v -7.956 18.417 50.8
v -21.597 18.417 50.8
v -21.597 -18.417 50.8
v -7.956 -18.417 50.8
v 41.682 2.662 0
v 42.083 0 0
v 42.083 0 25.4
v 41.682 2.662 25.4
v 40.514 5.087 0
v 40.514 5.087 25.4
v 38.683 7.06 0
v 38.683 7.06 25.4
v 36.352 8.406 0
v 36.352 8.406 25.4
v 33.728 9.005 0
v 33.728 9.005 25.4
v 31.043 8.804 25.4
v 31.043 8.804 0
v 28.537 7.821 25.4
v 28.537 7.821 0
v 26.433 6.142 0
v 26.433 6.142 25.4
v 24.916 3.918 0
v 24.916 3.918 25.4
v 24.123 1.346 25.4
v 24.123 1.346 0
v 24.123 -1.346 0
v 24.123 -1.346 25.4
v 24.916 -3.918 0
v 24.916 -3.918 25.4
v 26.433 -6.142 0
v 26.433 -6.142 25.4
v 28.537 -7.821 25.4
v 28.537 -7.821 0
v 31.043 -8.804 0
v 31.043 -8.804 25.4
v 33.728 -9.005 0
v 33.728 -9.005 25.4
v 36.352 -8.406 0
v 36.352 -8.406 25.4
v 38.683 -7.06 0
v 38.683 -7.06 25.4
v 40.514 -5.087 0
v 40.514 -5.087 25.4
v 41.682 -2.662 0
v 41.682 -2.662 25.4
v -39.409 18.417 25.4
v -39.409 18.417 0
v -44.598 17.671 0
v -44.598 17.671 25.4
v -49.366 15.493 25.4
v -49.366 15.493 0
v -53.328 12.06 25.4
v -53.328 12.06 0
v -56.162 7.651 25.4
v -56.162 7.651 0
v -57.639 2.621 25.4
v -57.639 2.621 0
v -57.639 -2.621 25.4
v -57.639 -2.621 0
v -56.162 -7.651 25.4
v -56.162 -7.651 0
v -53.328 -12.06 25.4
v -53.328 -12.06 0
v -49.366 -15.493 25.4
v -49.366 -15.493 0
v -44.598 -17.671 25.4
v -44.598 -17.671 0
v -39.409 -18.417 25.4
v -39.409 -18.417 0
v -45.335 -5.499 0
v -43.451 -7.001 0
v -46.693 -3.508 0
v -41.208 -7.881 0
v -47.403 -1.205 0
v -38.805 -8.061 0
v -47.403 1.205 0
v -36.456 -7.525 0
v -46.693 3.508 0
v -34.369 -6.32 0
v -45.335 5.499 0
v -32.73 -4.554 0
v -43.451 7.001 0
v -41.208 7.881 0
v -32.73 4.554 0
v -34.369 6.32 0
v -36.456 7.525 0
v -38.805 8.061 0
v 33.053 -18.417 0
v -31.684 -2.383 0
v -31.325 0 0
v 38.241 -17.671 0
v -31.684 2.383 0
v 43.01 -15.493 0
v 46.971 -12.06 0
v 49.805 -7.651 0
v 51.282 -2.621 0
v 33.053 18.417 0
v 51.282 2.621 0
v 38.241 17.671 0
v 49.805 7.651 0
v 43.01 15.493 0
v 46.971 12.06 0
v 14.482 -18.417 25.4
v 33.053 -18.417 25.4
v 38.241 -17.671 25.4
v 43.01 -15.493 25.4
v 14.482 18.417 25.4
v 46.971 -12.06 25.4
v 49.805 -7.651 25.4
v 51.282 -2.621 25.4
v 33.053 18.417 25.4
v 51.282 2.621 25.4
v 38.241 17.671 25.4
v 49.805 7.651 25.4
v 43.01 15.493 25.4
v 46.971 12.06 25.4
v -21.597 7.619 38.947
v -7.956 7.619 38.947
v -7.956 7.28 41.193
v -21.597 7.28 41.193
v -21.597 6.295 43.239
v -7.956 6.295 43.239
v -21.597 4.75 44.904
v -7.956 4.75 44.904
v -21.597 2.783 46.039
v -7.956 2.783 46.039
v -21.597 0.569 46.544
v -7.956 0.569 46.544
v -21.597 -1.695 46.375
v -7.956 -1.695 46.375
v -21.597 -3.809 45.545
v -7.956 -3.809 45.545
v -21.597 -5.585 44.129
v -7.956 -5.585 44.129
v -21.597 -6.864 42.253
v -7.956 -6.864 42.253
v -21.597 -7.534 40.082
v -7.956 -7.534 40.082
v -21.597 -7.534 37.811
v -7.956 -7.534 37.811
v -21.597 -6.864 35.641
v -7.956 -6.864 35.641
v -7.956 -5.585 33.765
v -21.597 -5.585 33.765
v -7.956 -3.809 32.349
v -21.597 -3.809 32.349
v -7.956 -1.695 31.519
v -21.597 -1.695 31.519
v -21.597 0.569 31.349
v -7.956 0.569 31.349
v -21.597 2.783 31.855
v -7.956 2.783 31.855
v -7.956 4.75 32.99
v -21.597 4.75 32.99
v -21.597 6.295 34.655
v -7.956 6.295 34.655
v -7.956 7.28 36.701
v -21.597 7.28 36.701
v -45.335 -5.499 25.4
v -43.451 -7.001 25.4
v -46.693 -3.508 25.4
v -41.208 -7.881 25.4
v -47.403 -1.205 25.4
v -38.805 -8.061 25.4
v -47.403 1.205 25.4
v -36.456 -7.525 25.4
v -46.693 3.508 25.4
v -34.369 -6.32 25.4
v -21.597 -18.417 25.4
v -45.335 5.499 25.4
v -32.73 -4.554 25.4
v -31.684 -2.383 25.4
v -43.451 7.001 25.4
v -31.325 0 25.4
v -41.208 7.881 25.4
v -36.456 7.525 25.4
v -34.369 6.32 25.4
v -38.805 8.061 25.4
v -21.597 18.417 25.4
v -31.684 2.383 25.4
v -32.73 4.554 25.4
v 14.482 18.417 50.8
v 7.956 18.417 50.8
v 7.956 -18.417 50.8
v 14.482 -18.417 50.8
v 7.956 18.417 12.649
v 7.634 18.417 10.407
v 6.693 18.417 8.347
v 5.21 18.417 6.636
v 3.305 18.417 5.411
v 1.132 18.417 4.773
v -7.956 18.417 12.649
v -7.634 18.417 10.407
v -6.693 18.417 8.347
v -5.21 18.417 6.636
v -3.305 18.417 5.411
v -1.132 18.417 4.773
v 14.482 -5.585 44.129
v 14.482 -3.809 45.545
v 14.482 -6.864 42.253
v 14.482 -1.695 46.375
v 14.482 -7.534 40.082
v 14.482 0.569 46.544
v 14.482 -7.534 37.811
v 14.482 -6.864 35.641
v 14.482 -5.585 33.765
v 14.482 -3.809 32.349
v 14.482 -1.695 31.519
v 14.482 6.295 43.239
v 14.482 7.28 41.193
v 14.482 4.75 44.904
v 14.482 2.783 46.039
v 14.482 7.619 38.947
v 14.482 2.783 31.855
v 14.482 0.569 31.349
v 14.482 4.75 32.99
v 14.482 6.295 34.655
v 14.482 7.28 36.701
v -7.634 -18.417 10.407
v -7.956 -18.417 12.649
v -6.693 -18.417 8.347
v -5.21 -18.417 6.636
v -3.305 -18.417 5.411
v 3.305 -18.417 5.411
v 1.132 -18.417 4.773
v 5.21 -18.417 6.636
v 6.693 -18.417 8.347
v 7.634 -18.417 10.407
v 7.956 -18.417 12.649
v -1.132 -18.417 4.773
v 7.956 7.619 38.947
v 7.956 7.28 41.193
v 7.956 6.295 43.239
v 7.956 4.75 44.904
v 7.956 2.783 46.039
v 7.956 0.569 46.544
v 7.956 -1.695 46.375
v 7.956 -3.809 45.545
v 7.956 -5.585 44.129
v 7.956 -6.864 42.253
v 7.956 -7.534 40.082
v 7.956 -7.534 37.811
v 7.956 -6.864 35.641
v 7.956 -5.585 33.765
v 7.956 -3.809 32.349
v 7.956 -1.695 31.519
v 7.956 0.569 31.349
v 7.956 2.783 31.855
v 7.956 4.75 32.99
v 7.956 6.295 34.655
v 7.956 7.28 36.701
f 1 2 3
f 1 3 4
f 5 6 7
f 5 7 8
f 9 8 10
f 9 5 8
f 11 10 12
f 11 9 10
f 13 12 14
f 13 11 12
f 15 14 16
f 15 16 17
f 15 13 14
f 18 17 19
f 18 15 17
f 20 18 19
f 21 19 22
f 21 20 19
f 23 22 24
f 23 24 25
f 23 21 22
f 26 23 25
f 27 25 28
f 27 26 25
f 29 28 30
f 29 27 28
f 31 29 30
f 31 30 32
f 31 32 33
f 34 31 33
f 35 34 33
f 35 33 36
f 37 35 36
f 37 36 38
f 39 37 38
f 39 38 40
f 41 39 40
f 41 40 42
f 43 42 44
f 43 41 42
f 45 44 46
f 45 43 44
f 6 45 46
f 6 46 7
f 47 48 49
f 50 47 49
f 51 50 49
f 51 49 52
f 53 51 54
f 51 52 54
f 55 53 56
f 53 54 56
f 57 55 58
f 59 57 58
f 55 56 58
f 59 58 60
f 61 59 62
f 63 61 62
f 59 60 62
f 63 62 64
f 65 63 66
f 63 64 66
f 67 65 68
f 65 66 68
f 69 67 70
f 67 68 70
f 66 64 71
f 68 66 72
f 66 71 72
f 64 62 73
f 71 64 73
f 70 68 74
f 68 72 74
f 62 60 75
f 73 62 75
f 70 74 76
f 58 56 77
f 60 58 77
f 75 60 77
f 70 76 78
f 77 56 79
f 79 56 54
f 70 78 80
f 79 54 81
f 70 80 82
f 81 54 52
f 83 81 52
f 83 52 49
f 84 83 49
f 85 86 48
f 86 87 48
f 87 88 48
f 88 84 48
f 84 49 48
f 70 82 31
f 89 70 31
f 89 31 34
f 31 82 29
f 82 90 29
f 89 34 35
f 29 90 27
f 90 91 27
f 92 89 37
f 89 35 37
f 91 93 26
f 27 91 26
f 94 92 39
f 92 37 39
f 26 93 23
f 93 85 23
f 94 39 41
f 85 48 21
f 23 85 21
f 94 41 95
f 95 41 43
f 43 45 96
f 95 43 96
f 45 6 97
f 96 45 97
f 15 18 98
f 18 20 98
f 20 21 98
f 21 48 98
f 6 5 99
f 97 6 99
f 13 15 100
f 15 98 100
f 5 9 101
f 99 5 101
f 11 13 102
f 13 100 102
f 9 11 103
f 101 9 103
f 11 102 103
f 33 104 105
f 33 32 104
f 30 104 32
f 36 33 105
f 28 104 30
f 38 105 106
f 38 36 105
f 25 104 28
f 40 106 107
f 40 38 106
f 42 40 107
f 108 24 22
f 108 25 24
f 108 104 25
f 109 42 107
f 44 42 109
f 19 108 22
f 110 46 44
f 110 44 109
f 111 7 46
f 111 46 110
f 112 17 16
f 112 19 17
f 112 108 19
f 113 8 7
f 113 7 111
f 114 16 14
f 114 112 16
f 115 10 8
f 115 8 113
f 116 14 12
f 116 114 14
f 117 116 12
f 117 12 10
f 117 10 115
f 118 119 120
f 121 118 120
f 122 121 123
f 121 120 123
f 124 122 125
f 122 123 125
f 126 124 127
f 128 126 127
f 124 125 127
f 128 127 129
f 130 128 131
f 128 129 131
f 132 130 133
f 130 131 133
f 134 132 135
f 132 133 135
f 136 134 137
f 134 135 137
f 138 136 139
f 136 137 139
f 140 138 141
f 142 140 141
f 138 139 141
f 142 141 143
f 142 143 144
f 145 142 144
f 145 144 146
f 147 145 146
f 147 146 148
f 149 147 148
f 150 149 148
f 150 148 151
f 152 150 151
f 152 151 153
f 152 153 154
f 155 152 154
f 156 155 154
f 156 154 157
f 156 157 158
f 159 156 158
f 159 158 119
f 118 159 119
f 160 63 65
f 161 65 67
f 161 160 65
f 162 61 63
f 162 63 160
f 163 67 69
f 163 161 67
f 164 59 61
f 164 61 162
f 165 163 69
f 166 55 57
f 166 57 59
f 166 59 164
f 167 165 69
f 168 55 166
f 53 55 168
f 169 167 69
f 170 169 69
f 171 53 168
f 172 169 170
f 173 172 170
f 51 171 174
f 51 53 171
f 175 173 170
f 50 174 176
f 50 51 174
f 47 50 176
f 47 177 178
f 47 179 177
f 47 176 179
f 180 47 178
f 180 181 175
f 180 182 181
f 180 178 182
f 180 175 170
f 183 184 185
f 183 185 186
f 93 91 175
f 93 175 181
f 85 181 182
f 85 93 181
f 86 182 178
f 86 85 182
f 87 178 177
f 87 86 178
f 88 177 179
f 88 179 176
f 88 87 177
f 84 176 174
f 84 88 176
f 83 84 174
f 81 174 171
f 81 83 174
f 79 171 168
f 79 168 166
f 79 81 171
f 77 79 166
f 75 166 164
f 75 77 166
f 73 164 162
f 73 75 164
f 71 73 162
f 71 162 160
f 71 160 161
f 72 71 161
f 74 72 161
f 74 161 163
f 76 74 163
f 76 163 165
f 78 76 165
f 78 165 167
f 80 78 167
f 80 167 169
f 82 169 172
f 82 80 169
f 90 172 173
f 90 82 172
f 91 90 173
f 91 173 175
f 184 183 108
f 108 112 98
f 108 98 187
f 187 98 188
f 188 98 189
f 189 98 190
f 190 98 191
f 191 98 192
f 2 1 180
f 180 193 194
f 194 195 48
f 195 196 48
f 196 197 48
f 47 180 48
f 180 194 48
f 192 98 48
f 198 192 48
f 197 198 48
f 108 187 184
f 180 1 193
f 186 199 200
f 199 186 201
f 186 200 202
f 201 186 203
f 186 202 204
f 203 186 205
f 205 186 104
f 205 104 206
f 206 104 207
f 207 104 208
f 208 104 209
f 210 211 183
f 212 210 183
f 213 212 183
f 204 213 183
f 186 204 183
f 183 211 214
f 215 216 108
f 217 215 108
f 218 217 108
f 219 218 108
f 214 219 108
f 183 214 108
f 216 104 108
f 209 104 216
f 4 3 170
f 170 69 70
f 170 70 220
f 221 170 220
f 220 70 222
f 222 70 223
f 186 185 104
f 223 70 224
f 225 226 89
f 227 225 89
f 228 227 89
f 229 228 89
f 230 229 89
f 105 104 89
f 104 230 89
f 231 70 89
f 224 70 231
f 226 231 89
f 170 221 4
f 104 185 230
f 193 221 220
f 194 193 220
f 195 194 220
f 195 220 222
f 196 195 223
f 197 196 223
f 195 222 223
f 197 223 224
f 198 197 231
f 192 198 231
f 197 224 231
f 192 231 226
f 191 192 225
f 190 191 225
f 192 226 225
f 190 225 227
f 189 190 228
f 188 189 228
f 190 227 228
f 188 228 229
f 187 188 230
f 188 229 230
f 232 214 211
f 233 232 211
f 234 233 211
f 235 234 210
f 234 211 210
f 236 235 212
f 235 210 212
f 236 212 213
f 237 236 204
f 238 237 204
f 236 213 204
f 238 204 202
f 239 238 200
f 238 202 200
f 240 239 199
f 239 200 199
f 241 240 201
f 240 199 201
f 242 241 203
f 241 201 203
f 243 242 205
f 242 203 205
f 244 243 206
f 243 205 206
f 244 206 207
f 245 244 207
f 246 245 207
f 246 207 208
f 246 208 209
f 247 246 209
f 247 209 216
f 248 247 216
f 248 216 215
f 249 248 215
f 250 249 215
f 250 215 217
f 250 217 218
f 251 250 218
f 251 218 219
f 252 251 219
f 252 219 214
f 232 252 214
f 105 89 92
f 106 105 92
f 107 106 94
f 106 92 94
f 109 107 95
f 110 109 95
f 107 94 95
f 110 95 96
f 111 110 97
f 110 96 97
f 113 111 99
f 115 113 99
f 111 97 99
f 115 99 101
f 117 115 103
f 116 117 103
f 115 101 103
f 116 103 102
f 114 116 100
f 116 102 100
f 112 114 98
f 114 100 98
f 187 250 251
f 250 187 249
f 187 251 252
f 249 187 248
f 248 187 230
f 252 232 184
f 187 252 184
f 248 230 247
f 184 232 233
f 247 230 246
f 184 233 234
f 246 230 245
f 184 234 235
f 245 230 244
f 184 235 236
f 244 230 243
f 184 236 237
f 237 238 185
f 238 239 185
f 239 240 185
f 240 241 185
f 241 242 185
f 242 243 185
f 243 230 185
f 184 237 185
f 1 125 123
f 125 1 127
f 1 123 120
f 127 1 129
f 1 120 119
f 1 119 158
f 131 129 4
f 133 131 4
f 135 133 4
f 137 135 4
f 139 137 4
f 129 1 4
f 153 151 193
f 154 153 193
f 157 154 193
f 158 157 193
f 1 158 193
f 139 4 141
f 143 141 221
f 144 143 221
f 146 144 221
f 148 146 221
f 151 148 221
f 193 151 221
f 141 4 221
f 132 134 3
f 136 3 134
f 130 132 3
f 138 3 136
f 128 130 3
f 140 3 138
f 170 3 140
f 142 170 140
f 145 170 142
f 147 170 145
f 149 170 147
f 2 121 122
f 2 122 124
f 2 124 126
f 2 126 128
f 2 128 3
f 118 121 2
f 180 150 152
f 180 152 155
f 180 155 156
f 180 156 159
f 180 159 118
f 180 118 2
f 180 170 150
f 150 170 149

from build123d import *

# Parameters (mm, degrees)
F0_R     = 8.0840946313
F0_R_2   = 9.0306543007
F1_DEPTH = 25.4
F2_W     = 36.0785173252
F2_H     = 36.8336421636
F3_DEPTH = 25.4
F5_DEPTH = 36.8346421636
F6_R     = 7.6188514612
F7_DEPTH = 72.3091809102


with BuildPart() as f1:
    # F0 (on Top) → F1 (new body)
    with BuildSketch(Plane.XY):
        with BuildLine():
            Line((33.0527582523, 18.4168210818), (-39.409391582, 18.4168210818))
            ThreePointArc((-39.409391582, 18.4168210818), (-57.8262126638, 0), (-39.409391582, -18.4168210818))
            Line((-39.409391582, -18.4168210818), (33.0527582523, -18.4168210818))
            ThreePointArc((33.0527582523, -18.4168210818), (51.4695793341, 0), (33.0527582523, 18.4168210818))
        make_face()
        with Locations((-39.409391582, 0)):
            Circle(F0_R, mode=Mode.SUBTRACT)
        with Locations((33.0527582523, 0)):
            Circle(F0_R_2, mode=Mode.SUBTRACT)
    extrude(amount=F1_DEPTH)

    # F2 (on face) → F3 (join)
    with BuildSketch(Plane.XY.offset(25.4)):
        with Locations((-3.5572904162, 0)):
            Rectangle(F2_W, F2_H)
    extrude(amount=F3_DEPTH)

    # F4 (on face) → F5 (cut, through all)
    with BuildSketch(Plane.XZ.offset(18.4168210818)):
        with BuildLine():
            Line((-7.9562223055, 50.8), (-7.9562223055, 12.6487202942))
            ThreePointArc((-7.9562223055, 12.6487202942), (0, 4.6924979887), (7.9562223055, 12.6487202942))
            Line((7.9562223055, 12.6487202942), (7.9562223055, 50.8))
            Line((7.9562223055, 50.8), (-7.9562223055, 50.8))
        make_face()
    extrude(amount=-F5_DEPTH, mode=Mode.SUBTRACT)

    # F6 (on face) → F7 (cut, through all)
    with BuildSketch(Plane.YZ.offset(14.4819682464)):
        with Locations((0, 38.9469414949)):
            Circle(F6_R)
    extrude(amount=-F7_DEPTH, mode=Mode.SUBTRACT)


solid = f1.part
